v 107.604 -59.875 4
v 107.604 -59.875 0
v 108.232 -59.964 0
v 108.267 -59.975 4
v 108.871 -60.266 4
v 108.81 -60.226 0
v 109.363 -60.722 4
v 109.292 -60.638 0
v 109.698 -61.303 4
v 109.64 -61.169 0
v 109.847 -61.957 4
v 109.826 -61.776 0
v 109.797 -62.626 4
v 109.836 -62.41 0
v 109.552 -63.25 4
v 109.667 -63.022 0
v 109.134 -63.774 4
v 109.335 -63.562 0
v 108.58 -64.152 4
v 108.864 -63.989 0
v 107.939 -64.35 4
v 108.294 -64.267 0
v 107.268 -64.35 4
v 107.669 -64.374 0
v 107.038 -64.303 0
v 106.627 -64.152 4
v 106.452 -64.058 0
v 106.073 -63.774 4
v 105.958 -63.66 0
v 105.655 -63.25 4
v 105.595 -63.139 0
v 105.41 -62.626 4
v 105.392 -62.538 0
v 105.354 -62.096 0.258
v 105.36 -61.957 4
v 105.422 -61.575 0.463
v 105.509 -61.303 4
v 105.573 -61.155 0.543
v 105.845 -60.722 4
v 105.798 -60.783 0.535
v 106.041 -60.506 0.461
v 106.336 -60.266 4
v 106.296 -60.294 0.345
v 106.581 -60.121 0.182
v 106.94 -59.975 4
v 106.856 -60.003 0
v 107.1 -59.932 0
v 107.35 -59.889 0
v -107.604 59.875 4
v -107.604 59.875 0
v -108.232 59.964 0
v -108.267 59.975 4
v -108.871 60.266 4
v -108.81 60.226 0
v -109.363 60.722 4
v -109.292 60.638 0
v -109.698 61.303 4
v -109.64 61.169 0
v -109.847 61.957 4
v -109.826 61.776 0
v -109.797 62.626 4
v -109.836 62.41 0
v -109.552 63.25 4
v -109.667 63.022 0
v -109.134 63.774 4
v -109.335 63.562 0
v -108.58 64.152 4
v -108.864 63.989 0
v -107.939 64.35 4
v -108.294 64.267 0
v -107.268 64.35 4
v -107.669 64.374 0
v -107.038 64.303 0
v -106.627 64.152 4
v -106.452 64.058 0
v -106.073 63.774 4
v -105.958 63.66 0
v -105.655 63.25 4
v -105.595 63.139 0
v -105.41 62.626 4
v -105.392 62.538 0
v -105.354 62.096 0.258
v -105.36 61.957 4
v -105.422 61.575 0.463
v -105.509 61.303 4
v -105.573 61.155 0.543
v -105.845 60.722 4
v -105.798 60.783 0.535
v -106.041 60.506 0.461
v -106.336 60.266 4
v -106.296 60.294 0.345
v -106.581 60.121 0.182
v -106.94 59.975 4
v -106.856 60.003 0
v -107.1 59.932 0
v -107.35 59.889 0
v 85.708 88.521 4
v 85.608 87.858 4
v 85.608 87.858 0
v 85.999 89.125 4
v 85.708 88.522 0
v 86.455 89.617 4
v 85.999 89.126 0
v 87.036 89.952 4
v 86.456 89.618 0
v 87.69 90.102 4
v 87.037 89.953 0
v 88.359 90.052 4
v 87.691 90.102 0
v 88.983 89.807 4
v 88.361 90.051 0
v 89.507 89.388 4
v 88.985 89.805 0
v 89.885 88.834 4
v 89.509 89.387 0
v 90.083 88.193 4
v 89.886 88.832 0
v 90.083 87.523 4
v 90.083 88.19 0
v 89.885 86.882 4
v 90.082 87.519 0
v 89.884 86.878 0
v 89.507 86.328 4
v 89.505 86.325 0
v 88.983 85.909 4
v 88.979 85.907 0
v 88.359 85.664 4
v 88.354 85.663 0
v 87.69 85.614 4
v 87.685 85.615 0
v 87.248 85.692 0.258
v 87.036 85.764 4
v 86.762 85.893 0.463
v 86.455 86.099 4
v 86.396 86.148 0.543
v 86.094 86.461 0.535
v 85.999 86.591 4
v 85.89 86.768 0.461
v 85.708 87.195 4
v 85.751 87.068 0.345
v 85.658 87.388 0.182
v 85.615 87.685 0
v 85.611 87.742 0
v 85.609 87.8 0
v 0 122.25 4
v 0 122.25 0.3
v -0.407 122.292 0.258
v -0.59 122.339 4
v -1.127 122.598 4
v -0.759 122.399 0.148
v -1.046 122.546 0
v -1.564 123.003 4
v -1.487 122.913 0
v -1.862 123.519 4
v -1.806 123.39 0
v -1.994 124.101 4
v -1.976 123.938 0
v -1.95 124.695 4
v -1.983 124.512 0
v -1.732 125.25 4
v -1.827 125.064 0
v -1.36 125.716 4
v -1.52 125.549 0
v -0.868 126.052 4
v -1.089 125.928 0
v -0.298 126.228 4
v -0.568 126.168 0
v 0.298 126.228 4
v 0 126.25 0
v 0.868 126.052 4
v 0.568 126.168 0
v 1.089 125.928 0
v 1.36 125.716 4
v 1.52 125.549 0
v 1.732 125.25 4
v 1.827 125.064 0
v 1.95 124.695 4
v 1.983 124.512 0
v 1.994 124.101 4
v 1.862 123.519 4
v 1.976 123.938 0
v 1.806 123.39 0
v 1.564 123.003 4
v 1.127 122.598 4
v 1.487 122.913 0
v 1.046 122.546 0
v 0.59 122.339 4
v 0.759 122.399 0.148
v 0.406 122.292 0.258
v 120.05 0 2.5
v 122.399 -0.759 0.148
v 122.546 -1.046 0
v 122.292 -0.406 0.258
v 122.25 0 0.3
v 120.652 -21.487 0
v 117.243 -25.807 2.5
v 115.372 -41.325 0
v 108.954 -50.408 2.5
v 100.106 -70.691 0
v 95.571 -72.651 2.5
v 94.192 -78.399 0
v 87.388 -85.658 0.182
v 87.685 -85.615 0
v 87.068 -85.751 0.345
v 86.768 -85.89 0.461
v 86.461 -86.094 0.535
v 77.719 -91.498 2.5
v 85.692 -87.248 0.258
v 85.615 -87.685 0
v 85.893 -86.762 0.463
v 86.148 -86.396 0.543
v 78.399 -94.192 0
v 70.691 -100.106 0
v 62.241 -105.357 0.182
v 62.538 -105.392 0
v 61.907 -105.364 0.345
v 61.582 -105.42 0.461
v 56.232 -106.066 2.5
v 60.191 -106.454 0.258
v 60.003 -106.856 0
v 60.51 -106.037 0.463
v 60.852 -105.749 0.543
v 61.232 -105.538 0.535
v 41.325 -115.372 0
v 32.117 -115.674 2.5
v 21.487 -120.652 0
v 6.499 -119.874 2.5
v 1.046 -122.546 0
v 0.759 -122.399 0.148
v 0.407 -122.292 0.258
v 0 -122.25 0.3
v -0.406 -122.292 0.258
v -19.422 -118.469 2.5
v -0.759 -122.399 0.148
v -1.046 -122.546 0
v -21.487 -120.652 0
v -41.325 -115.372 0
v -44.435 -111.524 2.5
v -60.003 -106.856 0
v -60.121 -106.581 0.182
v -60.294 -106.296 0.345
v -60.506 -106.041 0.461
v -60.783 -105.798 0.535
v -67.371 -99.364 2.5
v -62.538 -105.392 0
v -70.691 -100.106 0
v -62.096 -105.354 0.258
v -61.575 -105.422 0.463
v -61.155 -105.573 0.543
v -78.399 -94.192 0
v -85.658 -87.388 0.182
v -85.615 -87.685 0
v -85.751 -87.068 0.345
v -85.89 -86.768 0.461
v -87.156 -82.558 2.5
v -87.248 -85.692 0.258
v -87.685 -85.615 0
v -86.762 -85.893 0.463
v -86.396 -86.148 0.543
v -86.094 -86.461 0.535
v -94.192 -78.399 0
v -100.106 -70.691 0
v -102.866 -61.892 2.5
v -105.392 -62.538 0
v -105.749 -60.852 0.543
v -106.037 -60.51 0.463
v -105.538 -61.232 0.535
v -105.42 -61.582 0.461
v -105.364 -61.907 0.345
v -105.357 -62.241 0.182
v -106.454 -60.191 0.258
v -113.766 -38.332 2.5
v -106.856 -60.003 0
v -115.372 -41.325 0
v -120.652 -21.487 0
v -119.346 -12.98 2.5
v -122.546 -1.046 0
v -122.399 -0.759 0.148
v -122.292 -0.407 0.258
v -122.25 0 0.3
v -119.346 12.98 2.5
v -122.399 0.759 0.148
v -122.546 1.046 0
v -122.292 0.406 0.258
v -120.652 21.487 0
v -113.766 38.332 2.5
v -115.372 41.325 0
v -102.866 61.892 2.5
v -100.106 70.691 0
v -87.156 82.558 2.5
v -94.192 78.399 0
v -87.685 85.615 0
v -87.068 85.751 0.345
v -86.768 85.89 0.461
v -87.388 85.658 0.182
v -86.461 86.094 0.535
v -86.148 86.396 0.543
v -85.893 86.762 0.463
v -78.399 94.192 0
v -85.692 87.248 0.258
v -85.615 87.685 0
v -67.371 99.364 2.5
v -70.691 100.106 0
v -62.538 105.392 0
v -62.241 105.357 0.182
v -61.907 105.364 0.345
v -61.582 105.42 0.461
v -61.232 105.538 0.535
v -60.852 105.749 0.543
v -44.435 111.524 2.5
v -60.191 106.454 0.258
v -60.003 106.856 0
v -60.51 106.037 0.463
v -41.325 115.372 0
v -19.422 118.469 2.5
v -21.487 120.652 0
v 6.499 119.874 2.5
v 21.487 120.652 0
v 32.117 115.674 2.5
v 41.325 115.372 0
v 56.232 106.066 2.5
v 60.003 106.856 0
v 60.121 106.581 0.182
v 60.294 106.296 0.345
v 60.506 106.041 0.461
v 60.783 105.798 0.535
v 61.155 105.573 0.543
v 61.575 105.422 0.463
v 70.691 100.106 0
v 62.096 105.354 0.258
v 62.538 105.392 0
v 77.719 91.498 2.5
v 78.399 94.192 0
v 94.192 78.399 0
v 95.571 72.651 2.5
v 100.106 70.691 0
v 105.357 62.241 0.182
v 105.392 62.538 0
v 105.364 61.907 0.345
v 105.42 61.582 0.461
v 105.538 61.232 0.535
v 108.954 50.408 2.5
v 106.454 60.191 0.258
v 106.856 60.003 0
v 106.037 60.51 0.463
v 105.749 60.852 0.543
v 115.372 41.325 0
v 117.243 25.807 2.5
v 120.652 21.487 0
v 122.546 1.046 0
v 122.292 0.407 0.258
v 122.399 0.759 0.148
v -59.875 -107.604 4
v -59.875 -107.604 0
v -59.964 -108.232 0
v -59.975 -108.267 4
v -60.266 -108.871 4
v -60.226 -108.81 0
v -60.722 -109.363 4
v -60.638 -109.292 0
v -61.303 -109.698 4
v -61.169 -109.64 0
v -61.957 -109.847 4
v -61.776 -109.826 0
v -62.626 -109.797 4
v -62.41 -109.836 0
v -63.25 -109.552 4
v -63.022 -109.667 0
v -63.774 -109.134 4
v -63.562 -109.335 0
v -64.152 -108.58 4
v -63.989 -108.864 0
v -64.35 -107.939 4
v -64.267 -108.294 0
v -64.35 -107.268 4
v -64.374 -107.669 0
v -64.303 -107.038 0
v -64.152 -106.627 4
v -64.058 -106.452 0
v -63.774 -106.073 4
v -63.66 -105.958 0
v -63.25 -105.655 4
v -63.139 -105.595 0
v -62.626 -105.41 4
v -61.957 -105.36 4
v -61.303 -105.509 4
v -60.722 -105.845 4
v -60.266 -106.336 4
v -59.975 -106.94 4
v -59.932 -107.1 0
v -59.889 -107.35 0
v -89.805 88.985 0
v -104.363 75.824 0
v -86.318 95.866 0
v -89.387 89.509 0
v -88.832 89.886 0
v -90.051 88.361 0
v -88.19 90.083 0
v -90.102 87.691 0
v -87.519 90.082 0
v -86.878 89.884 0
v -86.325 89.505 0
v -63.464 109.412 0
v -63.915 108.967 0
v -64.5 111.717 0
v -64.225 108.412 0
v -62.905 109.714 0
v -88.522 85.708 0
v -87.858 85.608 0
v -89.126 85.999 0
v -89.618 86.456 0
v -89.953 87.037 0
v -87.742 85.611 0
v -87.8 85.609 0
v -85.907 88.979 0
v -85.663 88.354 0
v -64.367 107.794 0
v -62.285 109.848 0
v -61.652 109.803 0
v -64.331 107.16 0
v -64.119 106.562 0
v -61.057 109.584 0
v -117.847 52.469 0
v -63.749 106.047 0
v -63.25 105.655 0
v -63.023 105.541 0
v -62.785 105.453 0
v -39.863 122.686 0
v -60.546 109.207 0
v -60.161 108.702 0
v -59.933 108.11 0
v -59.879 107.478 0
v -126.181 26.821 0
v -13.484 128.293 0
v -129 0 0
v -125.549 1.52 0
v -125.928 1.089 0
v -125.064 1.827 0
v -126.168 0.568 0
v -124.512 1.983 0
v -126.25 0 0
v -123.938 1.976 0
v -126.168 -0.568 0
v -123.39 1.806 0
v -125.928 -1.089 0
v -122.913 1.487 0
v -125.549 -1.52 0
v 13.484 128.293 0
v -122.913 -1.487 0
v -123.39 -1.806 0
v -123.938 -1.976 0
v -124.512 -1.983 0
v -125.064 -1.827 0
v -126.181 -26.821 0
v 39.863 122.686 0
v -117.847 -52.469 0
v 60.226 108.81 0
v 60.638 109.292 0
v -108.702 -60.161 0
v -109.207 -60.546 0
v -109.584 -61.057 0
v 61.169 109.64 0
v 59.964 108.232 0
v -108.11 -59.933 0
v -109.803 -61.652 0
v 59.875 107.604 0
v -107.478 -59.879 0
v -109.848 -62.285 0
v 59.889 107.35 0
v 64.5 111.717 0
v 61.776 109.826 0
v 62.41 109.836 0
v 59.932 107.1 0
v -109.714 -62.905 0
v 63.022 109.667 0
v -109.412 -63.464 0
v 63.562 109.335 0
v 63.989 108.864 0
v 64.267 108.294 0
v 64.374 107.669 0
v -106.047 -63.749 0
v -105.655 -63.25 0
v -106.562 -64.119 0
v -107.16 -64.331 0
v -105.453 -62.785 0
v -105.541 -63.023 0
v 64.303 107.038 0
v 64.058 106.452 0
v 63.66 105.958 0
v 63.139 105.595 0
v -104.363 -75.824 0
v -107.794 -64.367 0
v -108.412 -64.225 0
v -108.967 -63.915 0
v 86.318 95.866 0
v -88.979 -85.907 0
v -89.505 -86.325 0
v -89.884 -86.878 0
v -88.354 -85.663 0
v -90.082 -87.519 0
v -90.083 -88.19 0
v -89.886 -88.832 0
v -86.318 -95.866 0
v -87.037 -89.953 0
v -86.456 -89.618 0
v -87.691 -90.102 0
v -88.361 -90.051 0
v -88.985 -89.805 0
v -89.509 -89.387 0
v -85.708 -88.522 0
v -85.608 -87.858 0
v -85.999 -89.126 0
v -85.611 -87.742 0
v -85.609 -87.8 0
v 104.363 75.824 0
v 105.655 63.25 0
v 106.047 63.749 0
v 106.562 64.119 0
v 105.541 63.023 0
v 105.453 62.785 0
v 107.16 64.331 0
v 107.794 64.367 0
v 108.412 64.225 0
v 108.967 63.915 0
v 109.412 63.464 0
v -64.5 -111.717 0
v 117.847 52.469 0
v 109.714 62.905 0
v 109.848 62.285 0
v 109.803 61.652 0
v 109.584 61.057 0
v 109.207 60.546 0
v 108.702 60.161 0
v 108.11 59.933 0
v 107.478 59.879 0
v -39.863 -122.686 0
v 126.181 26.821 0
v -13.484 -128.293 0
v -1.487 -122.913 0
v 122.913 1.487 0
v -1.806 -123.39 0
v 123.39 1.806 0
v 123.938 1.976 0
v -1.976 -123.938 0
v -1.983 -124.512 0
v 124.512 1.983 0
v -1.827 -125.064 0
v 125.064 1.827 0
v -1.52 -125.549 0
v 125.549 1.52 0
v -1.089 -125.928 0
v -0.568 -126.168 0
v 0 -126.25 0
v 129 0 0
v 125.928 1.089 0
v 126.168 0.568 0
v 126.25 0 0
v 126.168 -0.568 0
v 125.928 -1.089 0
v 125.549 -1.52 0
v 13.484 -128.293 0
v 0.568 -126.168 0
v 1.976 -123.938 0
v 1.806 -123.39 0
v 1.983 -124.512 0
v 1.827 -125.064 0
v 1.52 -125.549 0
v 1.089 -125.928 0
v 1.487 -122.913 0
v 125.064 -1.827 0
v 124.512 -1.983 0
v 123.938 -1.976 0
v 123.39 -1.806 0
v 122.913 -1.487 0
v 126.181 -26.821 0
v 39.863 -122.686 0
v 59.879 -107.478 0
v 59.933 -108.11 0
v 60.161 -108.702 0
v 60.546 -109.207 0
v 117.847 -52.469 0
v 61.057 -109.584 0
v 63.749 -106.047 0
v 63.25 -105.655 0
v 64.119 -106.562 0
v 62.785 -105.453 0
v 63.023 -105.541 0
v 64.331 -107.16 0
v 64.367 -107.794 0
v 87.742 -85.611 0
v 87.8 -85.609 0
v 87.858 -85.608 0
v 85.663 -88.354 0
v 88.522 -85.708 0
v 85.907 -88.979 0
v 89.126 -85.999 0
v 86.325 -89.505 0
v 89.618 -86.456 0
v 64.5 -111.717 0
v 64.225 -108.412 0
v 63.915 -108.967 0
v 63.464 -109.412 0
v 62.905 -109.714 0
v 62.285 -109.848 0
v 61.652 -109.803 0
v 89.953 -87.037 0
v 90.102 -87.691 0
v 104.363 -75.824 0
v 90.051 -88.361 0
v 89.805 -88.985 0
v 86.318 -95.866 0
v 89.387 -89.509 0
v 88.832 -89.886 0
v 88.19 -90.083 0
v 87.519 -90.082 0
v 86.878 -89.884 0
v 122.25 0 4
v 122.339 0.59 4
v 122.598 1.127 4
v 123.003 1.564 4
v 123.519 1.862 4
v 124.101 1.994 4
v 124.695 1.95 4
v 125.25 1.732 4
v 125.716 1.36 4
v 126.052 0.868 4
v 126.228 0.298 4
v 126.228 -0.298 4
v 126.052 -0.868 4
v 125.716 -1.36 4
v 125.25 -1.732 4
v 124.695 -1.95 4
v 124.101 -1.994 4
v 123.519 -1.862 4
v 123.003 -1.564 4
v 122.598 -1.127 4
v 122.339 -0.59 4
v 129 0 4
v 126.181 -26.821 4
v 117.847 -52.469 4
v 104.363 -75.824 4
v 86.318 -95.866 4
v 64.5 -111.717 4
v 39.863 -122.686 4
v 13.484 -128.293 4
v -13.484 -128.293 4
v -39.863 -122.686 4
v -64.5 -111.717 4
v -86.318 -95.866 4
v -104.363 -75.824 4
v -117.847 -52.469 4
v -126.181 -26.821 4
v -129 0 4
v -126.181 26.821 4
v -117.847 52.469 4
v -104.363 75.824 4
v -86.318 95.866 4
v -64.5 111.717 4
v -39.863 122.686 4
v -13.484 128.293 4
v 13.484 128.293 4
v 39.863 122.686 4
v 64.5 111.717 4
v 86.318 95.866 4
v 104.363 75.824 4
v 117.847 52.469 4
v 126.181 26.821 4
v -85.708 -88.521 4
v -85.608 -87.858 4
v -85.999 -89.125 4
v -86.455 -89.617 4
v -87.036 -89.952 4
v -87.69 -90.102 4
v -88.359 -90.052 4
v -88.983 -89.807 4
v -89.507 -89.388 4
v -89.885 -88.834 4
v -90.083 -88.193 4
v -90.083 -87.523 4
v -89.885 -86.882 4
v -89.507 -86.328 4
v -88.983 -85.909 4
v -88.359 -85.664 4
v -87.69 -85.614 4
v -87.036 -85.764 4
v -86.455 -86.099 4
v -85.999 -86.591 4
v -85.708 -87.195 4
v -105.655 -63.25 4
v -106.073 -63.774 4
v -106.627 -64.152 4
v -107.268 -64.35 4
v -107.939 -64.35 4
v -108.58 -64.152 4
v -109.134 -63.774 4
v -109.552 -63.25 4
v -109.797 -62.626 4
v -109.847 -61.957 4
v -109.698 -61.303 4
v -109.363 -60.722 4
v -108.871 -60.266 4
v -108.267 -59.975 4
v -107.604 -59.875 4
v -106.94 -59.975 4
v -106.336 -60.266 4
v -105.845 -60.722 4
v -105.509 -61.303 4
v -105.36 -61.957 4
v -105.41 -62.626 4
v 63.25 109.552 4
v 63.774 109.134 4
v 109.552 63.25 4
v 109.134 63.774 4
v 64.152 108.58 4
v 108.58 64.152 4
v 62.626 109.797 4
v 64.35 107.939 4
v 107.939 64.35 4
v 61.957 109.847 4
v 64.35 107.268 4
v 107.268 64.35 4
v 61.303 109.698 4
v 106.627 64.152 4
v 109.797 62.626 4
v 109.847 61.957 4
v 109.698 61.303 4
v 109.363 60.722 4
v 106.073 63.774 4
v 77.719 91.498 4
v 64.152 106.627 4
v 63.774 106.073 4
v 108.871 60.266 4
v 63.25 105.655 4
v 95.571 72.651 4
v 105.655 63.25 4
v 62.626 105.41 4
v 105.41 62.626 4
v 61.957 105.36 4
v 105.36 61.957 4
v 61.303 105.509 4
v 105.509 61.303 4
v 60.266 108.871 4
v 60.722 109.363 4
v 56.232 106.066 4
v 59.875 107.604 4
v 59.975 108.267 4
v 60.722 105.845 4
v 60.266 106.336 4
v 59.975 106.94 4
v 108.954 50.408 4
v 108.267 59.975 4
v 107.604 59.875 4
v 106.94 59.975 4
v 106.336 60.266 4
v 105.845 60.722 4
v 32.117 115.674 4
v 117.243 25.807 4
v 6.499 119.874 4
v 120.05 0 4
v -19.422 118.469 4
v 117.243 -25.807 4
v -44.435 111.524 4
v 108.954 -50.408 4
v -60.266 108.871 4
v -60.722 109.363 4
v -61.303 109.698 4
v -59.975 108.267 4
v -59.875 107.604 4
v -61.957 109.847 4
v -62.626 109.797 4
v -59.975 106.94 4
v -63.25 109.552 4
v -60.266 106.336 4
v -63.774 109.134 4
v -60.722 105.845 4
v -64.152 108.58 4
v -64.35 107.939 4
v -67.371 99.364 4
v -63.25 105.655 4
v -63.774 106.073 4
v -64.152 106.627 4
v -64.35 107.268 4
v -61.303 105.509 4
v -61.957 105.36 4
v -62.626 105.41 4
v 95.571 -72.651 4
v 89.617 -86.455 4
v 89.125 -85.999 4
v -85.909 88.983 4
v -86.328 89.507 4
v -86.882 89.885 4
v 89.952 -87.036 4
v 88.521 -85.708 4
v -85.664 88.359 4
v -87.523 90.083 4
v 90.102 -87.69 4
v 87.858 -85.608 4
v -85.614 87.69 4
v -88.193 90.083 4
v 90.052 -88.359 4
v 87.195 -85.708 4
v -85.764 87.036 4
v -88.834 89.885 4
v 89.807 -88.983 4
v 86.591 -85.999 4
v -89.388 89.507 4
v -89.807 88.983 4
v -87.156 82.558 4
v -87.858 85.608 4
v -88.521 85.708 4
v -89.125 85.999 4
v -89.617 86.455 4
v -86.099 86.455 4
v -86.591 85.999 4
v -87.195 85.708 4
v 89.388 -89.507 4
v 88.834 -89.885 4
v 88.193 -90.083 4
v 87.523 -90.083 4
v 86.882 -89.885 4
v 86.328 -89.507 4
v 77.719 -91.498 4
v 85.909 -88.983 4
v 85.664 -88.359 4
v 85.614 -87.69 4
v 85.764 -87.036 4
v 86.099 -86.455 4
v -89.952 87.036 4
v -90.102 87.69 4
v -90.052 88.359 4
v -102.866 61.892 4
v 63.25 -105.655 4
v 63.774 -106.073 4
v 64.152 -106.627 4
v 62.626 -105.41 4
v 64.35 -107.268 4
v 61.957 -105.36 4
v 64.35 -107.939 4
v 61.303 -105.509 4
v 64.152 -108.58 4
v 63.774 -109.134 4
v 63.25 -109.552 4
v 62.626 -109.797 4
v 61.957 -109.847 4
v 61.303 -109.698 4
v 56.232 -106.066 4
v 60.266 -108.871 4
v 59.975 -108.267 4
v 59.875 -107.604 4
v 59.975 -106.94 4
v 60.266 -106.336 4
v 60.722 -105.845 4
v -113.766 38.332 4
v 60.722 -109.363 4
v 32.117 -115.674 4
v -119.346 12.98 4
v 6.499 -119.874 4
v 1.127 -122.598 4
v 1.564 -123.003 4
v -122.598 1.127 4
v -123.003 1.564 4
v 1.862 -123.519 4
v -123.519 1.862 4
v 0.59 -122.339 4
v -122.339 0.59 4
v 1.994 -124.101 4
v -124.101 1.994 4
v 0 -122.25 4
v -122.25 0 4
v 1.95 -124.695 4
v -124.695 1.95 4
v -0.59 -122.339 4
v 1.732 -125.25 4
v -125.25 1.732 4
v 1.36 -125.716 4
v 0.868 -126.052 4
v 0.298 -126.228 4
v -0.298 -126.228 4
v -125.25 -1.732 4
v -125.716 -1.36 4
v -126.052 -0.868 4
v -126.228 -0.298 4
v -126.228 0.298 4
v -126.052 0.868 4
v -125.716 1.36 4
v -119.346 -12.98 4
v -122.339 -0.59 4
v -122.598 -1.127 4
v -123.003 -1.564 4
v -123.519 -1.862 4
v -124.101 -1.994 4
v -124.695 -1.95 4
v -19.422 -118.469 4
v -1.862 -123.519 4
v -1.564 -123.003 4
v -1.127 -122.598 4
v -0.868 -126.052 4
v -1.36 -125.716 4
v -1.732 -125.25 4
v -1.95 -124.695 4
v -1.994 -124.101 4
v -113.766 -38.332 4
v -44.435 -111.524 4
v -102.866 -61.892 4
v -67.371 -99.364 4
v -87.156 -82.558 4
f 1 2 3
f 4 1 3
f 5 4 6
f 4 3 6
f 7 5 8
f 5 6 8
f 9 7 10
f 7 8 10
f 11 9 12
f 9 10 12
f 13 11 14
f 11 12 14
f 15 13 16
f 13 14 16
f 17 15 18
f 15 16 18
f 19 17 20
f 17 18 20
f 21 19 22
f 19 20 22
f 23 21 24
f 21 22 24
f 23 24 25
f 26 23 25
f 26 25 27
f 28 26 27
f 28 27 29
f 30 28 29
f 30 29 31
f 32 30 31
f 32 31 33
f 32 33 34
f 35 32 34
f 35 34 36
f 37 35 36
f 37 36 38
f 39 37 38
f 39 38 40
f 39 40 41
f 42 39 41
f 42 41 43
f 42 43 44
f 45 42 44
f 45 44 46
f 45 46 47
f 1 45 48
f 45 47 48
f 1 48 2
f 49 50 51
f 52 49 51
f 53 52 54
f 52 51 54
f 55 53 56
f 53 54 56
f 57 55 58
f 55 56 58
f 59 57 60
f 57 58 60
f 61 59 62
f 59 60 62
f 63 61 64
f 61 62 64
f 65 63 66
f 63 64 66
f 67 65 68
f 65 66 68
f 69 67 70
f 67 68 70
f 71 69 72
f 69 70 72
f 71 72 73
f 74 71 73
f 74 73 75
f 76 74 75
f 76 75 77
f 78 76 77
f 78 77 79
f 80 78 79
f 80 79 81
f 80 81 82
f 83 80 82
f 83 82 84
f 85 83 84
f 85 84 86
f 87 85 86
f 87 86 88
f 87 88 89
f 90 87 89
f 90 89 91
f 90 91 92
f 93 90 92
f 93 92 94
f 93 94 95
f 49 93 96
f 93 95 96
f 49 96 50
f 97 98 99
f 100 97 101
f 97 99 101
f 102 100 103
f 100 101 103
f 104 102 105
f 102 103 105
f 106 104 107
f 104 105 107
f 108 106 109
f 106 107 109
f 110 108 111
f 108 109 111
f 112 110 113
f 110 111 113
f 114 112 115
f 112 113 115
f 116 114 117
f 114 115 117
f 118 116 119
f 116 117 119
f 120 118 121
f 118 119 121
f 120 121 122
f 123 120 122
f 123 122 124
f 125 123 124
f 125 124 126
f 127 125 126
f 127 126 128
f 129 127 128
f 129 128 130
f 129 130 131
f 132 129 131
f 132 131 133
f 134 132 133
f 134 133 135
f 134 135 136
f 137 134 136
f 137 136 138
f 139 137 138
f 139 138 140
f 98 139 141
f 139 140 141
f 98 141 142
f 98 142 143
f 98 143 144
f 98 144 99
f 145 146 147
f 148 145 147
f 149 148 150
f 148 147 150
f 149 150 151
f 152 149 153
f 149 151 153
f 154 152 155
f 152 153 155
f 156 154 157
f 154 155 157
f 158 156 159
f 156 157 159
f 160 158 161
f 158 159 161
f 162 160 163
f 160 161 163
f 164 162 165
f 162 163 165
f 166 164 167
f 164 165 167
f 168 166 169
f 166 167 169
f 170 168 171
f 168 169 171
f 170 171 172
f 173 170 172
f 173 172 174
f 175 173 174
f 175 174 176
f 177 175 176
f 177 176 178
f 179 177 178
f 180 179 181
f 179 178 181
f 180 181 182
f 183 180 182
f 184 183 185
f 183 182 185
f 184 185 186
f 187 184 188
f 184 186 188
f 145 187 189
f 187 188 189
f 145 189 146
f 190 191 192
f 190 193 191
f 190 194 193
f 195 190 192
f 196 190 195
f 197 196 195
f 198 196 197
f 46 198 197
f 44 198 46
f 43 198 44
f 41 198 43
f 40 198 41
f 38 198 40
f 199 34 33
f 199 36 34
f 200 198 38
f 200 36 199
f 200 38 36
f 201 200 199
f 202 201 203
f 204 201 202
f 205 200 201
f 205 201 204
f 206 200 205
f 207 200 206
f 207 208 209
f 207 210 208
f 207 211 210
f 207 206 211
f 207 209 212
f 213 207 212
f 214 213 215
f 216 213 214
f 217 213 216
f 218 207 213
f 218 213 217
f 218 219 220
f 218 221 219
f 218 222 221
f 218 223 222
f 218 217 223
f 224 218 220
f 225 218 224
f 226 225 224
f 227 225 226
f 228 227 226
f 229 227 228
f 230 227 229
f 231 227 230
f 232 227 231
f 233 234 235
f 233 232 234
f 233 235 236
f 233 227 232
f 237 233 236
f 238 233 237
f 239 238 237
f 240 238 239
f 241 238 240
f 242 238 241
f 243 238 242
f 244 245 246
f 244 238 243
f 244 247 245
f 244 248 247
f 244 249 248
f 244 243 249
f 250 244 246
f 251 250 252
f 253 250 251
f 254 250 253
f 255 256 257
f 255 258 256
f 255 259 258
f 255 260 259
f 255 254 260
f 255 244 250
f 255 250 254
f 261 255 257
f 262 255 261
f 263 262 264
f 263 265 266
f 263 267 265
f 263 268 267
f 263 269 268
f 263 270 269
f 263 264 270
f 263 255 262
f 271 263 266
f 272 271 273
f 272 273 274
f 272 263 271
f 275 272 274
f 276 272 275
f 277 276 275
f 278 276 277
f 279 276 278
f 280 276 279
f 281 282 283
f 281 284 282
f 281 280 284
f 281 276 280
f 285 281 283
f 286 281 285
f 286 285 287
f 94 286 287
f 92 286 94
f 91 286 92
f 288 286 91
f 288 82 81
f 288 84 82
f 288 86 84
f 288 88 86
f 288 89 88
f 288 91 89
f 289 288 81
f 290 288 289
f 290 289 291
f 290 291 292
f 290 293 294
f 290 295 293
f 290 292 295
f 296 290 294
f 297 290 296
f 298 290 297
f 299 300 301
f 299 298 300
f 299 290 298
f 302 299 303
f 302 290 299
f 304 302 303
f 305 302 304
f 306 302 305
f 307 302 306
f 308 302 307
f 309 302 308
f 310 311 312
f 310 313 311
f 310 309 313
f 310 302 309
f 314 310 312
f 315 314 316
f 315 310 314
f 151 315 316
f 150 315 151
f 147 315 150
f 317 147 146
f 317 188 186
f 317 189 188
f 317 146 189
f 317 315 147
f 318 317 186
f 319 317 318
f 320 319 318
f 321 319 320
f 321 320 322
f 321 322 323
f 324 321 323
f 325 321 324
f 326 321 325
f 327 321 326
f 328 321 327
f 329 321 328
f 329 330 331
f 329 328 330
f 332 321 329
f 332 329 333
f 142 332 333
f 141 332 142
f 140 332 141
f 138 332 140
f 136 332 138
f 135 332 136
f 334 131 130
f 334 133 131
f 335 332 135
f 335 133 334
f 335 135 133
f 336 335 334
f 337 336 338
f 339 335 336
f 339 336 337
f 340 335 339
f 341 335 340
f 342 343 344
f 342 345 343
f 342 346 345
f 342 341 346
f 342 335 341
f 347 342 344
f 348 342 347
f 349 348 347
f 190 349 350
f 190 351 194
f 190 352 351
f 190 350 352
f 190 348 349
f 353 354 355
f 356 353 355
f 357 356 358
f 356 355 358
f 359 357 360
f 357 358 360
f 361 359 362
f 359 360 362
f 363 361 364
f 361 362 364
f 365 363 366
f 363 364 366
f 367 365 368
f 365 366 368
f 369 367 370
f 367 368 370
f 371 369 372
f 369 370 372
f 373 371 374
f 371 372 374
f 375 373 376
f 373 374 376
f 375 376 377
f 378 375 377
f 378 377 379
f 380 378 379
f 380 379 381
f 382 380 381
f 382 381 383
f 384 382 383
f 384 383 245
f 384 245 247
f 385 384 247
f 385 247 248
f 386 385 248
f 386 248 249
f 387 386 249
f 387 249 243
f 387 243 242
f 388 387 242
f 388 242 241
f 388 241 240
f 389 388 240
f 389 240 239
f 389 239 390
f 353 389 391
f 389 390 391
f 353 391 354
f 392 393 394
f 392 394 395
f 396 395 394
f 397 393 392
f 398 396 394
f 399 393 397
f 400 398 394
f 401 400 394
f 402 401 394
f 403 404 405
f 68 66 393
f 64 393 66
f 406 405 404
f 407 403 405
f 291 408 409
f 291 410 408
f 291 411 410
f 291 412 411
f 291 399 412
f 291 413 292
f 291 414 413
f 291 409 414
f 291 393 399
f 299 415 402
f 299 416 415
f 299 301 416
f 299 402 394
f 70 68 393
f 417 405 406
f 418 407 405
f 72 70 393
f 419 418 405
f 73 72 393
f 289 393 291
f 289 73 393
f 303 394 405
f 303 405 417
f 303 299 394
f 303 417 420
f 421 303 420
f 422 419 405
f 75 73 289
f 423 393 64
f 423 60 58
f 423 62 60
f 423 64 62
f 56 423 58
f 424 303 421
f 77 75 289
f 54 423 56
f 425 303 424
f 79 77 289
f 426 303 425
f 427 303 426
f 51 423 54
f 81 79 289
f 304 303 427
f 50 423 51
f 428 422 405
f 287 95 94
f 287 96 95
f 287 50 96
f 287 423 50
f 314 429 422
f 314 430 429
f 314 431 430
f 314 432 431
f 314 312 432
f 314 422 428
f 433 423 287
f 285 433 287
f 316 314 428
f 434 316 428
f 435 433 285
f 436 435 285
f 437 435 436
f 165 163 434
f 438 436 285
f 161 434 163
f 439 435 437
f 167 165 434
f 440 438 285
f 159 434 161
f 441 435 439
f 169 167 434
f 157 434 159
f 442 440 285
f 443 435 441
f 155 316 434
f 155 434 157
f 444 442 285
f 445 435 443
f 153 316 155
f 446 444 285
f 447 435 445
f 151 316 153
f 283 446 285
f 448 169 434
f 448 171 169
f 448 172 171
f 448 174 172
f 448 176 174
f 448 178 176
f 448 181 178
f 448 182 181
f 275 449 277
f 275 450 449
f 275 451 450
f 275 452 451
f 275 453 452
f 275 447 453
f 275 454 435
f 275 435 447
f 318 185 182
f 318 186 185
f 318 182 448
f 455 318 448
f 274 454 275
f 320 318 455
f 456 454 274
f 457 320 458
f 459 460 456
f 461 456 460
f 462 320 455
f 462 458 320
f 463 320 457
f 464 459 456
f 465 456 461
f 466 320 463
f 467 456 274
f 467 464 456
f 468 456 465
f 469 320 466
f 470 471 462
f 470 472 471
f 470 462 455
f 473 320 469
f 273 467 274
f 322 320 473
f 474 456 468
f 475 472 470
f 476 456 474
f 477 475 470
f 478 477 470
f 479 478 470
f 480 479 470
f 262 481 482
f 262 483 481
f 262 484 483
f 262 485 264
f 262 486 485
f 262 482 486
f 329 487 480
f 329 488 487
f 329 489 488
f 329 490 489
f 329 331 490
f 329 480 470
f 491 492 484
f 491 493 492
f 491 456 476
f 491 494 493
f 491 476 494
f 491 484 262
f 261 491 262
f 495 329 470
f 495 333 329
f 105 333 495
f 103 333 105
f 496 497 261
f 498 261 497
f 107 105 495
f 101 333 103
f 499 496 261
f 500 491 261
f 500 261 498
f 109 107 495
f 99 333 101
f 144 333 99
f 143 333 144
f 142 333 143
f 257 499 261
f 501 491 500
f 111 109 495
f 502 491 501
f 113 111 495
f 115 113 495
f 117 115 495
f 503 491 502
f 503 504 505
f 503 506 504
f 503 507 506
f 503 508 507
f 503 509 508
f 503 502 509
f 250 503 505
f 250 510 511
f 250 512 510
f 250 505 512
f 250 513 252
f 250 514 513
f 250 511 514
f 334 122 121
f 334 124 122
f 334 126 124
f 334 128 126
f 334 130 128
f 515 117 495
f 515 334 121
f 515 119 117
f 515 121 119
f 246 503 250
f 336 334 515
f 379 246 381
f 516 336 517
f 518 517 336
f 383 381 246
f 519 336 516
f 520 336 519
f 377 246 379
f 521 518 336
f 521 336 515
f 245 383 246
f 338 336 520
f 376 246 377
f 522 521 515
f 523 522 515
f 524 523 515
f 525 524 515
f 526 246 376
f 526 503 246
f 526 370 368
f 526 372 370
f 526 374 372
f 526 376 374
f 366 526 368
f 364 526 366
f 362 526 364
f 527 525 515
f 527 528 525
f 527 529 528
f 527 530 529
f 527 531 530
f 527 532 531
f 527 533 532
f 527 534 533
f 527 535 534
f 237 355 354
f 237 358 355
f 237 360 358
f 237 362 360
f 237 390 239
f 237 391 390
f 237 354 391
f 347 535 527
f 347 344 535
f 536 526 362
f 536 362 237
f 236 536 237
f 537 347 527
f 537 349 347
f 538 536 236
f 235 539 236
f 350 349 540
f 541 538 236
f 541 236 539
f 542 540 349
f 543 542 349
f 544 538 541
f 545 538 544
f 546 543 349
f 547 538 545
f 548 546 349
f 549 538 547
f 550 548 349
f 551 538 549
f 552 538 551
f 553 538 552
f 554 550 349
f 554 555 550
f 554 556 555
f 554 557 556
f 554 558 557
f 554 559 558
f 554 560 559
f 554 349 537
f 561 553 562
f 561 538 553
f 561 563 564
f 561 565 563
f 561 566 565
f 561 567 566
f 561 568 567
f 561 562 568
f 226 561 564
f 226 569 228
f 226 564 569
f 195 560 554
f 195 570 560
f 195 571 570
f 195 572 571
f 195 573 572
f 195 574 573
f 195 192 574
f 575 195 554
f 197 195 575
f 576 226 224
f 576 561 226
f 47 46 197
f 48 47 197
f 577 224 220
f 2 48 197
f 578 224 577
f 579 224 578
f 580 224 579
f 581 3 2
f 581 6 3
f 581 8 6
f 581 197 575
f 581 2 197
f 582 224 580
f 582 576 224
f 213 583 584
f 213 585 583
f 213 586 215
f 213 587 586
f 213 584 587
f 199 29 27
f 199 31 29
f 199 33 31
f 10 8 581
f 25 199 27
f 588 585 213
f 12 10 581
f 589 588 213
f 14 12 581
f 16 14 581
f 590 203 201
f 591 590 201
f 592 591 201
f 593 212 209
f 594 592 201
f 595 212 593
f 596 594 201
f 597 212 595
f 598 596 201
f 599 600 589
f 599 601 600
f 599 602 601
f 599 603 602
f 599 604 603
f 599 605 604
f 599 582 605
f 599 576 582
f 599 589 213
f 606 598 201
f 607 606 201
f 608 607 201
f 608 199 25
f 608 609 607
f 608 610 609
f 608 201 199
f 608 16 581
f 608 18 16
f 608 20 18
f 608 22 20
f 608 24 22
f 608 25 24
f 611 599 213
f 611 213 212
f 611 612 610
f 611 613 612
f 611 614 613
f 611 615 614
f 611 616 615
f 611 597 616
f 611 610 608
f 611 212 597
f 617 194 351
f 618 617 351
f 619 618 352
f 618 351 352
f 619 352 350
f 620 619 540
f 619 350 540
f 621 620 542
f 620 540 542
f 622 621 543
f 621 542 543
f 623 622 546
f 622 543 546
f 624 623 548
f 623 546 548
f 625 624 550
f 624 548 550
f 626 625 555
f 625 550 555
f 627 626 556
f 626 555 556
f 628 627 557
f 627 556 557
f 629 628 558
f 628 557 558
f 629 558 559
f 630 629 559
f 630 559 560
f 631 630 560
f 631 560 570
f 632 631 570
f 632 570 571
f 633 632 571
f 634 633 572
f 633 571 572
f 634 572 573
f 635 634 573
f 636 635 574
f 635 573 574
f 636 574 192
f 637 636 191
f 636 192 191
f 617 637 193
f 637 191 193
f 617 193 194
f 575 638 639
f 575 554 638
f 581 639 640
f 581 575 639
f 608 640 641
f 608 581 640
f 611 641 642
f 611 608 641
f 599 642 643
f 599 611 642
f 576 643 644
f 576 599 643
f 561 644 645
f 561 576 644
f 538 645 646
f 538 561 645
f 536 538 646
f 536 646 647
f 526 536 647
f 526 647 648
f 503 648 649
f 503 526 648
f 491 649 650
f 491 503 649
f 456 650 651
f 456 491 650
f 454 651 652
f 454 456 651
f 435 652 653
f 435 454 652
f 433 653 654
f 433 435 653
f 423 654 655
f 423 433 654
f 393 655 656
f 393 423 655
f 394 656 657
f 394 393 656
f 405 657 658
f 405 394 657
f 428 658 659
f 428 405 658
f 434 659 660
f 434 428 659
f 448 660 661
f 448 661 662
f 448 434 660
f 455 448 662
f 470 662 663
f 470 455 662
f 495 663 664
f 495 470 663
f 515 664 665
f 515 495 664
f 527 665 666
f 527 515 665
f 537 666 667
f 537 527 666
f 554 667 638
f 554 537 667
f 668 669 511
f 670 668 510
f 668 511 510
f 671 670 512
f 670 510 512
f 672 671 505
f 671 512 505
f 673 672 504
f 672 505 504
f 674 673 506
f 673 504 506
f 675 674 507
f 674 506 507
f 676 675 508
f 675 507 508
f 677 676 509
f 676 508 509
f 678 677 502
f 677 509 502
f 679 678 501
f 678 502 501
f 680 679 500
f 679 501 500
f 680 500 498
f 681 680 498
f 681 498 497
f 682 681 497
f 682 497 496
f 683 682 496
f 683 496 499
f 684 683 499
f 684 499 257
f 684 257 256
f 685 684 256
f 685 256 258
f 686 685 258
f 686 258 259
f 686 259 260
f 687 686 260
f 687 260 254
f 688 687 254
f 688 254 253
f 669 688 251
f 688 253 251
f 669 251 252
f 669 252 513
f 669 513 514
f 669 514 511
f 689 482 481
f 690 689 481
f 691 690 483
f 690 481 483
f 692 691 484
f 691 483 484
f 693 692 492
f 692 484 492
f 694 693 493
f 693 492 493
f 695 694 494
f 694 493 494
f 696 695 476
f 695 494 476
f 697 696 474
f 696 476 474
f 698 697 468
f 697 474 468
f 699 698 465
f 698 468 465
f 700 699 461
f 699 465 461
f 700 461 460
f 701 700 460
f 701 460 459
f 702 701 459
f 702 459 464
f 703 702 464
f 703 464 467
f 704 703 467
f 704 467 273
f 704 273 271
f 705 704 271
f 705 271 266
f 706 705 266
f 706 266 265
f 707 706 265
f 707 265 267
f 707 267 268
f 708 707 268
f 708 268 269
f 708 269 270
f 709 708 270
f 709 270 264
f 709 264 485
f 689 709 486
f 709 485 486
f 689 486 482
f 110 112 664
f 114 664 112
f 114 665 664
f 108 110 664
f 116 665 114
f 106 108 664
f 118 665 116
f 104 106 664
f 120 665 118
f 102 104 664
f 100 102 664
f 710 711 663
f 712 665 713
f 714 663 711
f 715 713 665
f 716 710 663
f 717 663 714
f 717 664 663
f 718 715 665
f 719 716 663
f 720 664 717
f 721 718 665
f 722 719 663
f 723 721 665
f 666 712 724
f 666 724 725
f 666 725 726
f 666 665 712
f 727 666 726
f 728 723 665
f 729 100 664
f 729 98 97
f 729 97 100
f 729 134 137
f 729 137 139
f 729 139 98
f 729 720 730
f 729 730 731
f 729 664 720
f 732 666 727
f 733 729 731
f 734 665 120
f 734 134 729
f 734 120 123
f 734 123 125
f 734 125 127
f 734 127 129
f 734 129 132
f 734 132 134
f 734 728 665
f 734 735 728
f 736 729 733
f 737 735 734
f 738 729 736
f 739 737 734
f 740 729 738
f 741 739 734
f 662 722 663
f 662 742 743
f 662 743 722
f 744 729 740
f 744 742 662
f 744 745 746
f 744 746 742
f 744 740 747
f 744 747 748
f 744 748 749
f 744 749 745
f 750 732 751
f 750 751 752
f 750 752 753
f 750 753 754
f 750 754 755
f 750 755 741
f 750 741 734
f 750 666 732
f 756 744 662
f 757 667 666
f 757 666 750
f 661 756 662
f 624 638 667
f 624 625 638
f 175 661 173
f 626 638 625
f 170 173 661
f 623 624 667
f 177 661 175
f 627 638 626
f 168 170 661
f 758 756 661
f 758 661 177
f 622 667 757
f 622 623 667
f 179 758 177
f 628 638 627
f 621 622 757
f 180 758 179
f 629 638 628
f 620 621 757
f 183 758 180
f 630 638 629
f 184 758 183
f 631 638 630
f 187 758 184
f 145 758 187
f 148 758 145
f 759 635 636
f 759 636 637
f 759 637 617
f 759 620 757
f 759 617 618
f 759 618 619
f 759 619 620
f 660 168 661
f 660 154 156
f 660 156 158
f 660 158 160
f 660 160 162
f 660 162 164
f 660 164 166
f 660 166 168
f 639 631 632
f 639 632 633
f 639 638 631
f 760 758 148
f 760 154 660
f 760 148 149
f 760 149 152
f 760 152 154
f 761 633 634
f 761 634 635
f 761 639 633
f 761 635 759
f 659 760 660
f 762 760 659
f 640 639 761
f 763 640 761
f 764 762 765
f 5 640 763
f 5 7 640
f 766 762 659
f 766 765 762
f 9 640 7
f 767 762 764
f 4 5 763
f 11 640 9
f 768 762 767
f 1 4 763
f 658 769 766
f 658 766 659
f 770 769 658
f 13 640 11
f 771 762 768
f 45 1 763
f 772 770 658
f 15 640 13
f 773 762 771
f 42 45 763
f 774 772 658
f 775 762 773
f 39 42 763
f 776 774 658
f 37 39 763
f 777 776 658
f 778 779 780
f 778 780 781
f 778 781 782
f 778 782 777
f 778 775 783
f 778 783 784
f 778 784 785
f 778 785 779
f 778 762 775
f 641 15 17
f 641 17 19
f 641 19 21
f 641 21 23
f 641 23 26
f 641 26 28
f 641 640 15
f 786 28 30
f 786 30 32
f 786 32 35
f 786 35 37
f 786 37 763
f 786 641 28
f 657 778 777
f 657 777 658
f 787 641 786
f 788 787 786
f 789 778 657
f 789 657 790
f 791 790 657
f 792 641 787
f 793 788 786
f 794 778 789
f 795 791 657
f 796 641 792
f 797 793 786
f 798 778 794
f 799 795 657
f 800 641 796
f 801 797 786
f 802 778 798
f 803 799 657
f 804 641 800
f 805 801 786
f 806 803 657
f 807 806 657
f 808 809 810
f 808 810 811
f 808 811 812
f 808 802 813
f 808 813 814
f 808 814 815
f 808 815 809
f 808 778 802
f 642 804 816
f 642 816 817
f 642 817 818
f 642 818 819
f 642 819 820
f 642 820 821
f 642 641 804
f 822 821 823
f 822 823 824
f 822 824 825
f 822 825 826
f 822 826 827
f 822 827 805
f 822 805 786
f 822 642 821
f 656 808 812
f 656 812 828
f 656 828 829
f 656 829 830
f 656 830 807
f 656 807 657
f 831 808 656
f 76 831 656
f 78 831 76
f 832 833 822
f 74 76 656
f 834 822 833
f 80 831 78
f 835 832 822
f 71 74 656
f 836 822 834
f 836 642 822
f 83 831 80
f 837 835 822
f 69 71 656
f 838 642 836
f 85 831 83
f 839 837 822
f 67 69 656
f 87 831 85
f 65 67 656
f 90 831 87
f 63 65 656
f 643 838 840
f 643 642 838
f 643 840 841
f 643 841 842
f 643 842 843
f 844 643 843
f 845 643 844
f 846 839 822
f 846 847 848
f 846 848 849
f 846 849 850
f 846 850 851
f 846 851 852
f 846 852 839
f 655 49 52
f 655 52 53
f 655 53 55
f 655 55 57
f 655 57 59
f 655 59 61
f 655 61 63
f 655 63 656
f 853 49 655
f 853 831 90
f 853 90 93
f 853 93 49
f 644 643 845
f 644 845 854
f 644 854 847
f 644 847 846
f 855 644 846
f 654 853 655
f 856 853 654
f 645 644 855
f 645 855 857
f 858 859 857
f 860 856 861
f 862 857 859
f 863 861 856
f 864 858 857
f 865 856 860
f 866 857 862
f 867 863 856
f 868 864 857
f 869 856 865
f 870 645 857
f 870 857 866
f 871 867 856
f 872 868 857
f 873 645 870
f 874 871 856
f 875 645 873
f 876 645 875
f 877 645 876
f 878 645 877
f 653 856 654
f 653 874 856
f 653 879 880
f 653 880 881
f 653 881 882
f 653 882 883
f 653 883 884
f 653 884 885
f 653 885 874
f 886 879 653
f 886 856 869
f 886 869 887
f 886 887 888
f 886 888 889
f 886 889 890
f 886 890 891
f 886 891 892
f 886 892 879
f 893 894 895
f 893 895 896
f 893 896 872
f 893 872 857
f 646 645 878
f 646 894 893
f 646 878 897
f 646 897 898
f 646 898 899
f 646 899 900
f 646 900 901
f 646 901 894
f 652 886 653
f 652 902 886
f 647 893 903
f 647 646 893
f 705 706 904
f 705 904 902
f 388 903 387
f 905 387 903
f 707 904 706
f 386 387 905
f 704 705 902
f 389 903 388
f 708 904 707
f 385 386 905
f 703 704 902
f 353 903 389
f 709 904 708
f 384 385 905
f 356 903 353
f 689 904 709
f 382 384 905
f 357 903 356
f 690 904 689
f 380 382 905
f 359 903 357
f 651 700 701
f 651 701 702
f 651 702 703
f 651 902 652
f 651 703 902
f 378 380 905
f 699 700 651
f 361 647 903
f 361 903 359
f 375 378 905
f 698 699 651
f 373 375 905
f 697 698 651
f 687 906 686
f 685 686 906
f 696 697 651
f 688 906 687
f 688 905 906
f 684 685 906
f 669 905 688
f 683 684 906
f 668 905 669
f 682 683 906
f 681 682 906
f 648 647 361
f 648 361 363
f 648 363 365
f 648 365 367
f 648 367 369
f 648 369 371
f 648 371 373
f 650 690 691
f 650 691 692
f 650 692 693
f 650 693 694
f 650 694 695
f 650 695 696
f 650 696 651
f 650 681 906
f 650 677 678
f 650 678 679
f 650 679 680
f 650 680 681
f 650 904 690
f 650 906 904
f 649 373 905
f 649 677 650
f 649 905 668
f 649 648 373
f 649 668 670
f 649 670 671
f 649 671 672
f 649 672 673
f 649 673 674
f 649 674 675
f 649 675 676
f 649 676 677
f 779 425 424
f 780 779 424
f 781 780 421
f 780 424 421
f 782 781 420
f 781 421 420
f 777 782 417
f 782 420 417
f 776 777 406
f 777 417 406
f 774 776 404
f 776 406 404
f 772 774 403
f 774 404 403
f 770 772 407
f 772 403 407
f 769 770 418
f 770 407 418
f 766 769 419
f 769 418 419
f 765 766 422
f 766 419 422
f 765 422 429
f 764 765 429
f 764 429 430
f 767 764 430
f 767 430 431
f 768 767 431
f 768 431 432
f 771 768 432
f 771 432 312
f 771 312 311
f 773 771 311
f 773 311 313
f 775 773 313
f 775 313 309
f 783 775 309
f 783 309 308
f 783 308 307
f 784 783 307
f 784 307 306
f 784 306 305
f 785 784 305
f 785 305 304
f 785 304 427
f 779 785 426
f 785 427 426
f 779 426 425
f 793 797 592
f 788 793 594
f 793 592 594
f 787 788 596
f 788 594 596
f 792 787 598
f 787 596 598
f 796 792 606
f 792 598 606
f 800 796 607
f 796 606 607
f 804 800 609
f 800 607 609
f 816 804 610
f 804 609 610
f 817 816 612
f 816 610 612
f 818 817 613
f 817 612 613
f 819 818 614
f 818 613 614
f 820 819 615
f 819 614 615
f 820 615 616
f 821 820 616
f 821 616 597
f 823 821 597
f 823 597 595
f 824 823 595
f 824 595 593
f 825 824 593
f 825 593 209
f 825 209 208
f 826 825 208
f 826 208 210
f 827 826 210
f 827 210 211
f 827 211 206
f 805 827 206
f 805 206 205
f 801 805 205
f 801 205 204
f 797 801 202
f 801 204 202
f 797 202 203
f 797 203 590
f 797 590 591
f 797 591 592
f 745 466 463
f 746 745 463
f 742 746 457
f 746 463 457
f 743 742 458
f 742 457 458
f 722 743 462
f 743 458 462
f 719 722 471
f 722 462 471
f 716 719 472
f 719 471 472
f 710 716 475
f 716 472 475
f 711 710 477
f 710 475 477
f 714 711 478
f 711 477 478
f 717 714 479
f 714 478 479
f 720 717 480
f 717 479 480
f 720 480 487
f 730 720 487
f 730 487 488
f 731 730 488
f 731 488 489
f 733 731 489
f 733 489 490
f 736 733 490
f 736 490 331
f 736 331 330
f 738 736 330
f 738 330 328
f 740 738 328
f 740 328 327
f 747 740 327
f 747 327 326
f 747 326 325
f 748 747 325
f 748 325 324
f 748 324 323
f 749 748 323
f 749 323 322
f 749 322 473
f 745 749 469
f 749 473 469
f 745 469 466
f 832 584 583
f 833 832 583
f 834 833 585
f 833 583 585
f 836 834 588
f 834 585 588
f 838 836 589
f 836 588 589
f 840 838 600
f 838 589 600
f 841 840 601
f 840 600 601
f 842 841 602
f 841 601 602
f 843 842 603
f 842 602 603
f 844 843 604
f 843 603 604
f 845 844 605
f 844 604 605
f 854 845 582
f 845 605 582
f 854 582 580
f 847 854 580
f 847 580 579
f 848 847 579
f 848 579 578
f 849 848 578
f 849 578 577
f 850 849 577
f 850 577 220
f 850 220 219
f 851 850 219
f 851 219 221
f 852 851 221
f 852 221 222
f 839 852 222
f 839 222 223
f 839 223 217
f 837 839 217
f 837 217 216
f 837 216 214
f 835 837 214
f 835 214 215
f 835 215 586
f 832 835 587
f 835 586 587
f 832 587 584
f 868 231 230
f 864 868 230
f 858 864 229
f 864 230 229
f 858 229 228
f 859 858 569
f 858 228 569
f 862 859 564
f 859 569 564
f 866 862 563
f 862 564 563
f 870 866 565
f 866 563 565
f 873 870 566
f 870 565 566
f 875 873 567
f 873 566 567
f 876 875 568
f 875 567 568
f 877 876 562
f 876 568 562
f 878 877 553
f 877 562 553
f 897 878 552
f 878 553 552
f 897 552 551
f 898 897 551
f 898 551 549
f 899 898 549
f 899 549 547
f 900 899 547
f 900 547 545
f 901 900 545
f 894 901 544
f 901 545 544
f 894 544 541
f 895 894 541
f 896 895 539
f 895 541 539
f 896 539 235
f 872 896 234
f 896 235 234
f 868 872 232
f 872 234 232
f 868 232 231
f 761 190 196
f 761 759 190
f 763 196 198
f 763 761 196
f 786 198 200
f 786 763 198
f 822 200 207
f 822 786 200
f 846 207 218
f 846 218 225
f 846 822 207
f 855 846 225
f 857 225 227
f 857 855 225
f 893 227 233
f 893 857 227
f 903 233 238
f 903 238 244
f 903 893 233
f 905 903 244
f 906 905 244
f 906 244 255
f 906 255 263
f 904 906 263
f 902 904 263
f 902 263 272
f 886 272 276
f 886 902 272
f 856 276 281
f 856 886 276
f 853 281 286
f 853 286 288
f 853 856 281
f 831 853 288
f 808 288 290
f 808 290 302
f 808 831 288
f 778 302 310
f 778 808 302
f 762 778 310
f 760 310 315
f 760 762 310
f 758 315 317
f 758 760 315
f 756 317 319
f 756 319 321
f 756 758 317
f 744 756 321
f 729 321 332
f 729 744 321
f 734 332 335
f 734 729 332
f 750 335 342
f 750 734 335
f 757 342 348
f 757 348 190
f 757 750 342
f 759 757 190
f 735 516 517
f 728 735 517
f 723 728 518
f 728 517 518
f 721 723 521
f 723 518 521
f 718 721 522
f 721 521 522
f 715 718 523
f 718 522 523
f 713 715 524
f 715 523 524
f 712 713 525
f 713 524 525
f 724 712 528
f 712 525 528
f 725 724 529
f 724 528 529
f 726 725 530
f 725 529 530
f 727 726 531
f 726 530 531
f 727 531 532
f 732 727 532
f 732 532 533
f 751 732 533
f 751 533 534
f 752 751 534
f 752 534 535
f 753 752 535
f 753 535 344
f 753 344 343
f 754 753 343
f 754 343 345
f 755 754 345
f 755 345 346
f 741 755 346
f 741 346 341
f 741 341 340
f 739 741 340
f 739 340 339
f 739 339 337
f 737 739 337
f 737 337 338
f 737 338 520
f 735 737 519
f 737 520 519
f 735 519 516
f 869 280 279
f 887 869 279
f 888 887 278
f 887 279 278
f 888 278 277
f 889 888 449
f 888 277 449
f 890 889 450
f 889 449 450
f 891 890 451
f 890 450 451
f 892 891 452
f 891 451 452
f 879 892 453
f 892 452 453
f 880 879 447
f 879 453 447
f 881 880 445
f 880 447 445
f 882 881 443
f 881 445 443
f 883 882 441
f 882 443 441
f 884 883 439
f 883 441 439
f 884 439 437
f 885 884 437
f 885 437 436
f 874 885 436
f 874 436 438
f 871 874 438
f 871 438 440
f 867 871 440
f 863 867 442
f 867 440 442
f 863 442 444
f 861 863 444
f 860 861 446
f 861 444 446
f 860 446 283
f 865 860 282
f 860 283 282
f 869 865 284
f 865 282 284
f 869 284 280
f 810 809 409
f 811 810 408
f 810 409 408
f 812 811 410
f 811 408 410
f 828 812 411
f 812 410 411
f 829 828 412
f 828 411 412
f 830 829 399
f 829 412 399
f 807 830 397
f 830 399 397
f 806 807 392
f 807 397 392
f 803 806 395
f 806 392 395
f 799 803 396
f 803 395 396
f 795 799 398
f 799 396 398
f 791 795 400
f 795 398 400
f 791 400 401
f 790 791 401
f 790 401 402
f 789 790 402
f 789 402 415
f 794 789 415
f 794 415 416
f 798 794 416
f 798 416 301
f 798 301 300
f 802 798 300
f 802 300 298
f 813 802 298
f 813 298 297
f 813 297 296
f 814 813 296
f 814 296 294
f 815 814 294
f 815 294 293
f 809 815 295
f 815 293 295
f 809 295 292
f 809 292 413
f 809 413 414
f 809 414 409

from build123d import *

# Parameters (mm, degrees)
F_4_5_4_5_DIAMETER_HOLE1_D = 4.5
CIRPATTERN1_COUNT          = 12
F_4_0_4_DIAMETER_HOLE1_D   = 4
CIRPATTERN2_COUNT          = 4
F_4_5_4_5_DIAMETER_HOLE2_D = 4.5
CIRPATTERN3_COUNT          = 4


with BuildPart() as part:
    # Sketch1 → Revolve1 (revolve)
    with BuildSketch(Plane(origin=(0, 0, 0), x_dir=(0, 0, -1), z_dir=(1, 0, 0)), mode=Mode.PRIVATE) as revolve1_sk:
        Polygon((0, 122.55), (-2.5, 120.05), (-4, 120.05), (-4, 129), (0, 129), align=None)
    revolve(revolve1_sk.sketch.rotate(Axis((0, 0, 27.349424097), (0, 0, -1)), 90), axis=Axis((0, 0, 27.349424097), (0, 0, -1)))  # turned: the seam where the file's is

    # Ø4.5 (4.5) Diameter Hole1 (through all)
    with Locations(Plane.XY.offset(4)):
        with Locations((62.125, 107.60365642)):
            f_4_5_4_5_diameter_hole1 = Hole(F_4_5_4_5_DIAMETER_HOLE1_D / 2)

    # CirPattern1: Ø4.5 (4.5) Diameter Hole1 ×12 about axis, 4 skipped
    cirpattern1_axis = Axis((0, 0, -80.9), (0, 0, 1))
    add([f_4_5_4_5_diameter_hole1.rotate(cirpattern1_axis, i * 360 / CIRPATTERN1_COUNT) for i in range(1, CIRPATTERN1_COUNT) if i not in (1, 4, 7, 10)], mode=Mode.SUBTRACT)

    # Ø4.0 (4) Diameter Hole1 (through all)
    with Locations(Plane.XY.offset(4)):
        with Locations((124.25, 0)):
            f_4_0_4_diameter_hole1 = Hole(F_4_0_4_DIAMETER_HOLE1_D / 2)

    # CirPattern2: Ø4.0 (4) Diameter Hole1 ×4 about axis
    cirpattern2_axis = Axis((0, 0, 0), (0, 0, 1))
    for i in range(1, CIRPATTERN2_COUNT):
        add(f_4_0_4_diameter_hole1.rotate(cirpattern2_axis, i * 360 / CIRPATTERN2_COUNT), mode=Mode.SUBTRACT)

    # Ø4.5 (4.5) Diameter Hole2 (through all)
    with Locations(Plane.XY.offset(4)):
        with Locations((87.858017562, 87.858017562)):
            f_4_5_4_5_diameter_hole2 = Hole(F_4_5_4_5_DIAMETER_HOLE2_D / 2)

    # CirPattern3: Ø4.5 (4.5) Diameter Hole2 ×4 about axis
    cirpattern3_axis = Axis((0, 0, 0), (0, 0, 1))
    for i in range(1, CIRPATTERN3_COUNT):
        add(f_4_5_4_5_diameter_hole2.rotate(cirpattern3_axis, i * 360 / CIRPATTERN3_COUNT), mode=Mode.SUBTRACT)


solid = part.part
